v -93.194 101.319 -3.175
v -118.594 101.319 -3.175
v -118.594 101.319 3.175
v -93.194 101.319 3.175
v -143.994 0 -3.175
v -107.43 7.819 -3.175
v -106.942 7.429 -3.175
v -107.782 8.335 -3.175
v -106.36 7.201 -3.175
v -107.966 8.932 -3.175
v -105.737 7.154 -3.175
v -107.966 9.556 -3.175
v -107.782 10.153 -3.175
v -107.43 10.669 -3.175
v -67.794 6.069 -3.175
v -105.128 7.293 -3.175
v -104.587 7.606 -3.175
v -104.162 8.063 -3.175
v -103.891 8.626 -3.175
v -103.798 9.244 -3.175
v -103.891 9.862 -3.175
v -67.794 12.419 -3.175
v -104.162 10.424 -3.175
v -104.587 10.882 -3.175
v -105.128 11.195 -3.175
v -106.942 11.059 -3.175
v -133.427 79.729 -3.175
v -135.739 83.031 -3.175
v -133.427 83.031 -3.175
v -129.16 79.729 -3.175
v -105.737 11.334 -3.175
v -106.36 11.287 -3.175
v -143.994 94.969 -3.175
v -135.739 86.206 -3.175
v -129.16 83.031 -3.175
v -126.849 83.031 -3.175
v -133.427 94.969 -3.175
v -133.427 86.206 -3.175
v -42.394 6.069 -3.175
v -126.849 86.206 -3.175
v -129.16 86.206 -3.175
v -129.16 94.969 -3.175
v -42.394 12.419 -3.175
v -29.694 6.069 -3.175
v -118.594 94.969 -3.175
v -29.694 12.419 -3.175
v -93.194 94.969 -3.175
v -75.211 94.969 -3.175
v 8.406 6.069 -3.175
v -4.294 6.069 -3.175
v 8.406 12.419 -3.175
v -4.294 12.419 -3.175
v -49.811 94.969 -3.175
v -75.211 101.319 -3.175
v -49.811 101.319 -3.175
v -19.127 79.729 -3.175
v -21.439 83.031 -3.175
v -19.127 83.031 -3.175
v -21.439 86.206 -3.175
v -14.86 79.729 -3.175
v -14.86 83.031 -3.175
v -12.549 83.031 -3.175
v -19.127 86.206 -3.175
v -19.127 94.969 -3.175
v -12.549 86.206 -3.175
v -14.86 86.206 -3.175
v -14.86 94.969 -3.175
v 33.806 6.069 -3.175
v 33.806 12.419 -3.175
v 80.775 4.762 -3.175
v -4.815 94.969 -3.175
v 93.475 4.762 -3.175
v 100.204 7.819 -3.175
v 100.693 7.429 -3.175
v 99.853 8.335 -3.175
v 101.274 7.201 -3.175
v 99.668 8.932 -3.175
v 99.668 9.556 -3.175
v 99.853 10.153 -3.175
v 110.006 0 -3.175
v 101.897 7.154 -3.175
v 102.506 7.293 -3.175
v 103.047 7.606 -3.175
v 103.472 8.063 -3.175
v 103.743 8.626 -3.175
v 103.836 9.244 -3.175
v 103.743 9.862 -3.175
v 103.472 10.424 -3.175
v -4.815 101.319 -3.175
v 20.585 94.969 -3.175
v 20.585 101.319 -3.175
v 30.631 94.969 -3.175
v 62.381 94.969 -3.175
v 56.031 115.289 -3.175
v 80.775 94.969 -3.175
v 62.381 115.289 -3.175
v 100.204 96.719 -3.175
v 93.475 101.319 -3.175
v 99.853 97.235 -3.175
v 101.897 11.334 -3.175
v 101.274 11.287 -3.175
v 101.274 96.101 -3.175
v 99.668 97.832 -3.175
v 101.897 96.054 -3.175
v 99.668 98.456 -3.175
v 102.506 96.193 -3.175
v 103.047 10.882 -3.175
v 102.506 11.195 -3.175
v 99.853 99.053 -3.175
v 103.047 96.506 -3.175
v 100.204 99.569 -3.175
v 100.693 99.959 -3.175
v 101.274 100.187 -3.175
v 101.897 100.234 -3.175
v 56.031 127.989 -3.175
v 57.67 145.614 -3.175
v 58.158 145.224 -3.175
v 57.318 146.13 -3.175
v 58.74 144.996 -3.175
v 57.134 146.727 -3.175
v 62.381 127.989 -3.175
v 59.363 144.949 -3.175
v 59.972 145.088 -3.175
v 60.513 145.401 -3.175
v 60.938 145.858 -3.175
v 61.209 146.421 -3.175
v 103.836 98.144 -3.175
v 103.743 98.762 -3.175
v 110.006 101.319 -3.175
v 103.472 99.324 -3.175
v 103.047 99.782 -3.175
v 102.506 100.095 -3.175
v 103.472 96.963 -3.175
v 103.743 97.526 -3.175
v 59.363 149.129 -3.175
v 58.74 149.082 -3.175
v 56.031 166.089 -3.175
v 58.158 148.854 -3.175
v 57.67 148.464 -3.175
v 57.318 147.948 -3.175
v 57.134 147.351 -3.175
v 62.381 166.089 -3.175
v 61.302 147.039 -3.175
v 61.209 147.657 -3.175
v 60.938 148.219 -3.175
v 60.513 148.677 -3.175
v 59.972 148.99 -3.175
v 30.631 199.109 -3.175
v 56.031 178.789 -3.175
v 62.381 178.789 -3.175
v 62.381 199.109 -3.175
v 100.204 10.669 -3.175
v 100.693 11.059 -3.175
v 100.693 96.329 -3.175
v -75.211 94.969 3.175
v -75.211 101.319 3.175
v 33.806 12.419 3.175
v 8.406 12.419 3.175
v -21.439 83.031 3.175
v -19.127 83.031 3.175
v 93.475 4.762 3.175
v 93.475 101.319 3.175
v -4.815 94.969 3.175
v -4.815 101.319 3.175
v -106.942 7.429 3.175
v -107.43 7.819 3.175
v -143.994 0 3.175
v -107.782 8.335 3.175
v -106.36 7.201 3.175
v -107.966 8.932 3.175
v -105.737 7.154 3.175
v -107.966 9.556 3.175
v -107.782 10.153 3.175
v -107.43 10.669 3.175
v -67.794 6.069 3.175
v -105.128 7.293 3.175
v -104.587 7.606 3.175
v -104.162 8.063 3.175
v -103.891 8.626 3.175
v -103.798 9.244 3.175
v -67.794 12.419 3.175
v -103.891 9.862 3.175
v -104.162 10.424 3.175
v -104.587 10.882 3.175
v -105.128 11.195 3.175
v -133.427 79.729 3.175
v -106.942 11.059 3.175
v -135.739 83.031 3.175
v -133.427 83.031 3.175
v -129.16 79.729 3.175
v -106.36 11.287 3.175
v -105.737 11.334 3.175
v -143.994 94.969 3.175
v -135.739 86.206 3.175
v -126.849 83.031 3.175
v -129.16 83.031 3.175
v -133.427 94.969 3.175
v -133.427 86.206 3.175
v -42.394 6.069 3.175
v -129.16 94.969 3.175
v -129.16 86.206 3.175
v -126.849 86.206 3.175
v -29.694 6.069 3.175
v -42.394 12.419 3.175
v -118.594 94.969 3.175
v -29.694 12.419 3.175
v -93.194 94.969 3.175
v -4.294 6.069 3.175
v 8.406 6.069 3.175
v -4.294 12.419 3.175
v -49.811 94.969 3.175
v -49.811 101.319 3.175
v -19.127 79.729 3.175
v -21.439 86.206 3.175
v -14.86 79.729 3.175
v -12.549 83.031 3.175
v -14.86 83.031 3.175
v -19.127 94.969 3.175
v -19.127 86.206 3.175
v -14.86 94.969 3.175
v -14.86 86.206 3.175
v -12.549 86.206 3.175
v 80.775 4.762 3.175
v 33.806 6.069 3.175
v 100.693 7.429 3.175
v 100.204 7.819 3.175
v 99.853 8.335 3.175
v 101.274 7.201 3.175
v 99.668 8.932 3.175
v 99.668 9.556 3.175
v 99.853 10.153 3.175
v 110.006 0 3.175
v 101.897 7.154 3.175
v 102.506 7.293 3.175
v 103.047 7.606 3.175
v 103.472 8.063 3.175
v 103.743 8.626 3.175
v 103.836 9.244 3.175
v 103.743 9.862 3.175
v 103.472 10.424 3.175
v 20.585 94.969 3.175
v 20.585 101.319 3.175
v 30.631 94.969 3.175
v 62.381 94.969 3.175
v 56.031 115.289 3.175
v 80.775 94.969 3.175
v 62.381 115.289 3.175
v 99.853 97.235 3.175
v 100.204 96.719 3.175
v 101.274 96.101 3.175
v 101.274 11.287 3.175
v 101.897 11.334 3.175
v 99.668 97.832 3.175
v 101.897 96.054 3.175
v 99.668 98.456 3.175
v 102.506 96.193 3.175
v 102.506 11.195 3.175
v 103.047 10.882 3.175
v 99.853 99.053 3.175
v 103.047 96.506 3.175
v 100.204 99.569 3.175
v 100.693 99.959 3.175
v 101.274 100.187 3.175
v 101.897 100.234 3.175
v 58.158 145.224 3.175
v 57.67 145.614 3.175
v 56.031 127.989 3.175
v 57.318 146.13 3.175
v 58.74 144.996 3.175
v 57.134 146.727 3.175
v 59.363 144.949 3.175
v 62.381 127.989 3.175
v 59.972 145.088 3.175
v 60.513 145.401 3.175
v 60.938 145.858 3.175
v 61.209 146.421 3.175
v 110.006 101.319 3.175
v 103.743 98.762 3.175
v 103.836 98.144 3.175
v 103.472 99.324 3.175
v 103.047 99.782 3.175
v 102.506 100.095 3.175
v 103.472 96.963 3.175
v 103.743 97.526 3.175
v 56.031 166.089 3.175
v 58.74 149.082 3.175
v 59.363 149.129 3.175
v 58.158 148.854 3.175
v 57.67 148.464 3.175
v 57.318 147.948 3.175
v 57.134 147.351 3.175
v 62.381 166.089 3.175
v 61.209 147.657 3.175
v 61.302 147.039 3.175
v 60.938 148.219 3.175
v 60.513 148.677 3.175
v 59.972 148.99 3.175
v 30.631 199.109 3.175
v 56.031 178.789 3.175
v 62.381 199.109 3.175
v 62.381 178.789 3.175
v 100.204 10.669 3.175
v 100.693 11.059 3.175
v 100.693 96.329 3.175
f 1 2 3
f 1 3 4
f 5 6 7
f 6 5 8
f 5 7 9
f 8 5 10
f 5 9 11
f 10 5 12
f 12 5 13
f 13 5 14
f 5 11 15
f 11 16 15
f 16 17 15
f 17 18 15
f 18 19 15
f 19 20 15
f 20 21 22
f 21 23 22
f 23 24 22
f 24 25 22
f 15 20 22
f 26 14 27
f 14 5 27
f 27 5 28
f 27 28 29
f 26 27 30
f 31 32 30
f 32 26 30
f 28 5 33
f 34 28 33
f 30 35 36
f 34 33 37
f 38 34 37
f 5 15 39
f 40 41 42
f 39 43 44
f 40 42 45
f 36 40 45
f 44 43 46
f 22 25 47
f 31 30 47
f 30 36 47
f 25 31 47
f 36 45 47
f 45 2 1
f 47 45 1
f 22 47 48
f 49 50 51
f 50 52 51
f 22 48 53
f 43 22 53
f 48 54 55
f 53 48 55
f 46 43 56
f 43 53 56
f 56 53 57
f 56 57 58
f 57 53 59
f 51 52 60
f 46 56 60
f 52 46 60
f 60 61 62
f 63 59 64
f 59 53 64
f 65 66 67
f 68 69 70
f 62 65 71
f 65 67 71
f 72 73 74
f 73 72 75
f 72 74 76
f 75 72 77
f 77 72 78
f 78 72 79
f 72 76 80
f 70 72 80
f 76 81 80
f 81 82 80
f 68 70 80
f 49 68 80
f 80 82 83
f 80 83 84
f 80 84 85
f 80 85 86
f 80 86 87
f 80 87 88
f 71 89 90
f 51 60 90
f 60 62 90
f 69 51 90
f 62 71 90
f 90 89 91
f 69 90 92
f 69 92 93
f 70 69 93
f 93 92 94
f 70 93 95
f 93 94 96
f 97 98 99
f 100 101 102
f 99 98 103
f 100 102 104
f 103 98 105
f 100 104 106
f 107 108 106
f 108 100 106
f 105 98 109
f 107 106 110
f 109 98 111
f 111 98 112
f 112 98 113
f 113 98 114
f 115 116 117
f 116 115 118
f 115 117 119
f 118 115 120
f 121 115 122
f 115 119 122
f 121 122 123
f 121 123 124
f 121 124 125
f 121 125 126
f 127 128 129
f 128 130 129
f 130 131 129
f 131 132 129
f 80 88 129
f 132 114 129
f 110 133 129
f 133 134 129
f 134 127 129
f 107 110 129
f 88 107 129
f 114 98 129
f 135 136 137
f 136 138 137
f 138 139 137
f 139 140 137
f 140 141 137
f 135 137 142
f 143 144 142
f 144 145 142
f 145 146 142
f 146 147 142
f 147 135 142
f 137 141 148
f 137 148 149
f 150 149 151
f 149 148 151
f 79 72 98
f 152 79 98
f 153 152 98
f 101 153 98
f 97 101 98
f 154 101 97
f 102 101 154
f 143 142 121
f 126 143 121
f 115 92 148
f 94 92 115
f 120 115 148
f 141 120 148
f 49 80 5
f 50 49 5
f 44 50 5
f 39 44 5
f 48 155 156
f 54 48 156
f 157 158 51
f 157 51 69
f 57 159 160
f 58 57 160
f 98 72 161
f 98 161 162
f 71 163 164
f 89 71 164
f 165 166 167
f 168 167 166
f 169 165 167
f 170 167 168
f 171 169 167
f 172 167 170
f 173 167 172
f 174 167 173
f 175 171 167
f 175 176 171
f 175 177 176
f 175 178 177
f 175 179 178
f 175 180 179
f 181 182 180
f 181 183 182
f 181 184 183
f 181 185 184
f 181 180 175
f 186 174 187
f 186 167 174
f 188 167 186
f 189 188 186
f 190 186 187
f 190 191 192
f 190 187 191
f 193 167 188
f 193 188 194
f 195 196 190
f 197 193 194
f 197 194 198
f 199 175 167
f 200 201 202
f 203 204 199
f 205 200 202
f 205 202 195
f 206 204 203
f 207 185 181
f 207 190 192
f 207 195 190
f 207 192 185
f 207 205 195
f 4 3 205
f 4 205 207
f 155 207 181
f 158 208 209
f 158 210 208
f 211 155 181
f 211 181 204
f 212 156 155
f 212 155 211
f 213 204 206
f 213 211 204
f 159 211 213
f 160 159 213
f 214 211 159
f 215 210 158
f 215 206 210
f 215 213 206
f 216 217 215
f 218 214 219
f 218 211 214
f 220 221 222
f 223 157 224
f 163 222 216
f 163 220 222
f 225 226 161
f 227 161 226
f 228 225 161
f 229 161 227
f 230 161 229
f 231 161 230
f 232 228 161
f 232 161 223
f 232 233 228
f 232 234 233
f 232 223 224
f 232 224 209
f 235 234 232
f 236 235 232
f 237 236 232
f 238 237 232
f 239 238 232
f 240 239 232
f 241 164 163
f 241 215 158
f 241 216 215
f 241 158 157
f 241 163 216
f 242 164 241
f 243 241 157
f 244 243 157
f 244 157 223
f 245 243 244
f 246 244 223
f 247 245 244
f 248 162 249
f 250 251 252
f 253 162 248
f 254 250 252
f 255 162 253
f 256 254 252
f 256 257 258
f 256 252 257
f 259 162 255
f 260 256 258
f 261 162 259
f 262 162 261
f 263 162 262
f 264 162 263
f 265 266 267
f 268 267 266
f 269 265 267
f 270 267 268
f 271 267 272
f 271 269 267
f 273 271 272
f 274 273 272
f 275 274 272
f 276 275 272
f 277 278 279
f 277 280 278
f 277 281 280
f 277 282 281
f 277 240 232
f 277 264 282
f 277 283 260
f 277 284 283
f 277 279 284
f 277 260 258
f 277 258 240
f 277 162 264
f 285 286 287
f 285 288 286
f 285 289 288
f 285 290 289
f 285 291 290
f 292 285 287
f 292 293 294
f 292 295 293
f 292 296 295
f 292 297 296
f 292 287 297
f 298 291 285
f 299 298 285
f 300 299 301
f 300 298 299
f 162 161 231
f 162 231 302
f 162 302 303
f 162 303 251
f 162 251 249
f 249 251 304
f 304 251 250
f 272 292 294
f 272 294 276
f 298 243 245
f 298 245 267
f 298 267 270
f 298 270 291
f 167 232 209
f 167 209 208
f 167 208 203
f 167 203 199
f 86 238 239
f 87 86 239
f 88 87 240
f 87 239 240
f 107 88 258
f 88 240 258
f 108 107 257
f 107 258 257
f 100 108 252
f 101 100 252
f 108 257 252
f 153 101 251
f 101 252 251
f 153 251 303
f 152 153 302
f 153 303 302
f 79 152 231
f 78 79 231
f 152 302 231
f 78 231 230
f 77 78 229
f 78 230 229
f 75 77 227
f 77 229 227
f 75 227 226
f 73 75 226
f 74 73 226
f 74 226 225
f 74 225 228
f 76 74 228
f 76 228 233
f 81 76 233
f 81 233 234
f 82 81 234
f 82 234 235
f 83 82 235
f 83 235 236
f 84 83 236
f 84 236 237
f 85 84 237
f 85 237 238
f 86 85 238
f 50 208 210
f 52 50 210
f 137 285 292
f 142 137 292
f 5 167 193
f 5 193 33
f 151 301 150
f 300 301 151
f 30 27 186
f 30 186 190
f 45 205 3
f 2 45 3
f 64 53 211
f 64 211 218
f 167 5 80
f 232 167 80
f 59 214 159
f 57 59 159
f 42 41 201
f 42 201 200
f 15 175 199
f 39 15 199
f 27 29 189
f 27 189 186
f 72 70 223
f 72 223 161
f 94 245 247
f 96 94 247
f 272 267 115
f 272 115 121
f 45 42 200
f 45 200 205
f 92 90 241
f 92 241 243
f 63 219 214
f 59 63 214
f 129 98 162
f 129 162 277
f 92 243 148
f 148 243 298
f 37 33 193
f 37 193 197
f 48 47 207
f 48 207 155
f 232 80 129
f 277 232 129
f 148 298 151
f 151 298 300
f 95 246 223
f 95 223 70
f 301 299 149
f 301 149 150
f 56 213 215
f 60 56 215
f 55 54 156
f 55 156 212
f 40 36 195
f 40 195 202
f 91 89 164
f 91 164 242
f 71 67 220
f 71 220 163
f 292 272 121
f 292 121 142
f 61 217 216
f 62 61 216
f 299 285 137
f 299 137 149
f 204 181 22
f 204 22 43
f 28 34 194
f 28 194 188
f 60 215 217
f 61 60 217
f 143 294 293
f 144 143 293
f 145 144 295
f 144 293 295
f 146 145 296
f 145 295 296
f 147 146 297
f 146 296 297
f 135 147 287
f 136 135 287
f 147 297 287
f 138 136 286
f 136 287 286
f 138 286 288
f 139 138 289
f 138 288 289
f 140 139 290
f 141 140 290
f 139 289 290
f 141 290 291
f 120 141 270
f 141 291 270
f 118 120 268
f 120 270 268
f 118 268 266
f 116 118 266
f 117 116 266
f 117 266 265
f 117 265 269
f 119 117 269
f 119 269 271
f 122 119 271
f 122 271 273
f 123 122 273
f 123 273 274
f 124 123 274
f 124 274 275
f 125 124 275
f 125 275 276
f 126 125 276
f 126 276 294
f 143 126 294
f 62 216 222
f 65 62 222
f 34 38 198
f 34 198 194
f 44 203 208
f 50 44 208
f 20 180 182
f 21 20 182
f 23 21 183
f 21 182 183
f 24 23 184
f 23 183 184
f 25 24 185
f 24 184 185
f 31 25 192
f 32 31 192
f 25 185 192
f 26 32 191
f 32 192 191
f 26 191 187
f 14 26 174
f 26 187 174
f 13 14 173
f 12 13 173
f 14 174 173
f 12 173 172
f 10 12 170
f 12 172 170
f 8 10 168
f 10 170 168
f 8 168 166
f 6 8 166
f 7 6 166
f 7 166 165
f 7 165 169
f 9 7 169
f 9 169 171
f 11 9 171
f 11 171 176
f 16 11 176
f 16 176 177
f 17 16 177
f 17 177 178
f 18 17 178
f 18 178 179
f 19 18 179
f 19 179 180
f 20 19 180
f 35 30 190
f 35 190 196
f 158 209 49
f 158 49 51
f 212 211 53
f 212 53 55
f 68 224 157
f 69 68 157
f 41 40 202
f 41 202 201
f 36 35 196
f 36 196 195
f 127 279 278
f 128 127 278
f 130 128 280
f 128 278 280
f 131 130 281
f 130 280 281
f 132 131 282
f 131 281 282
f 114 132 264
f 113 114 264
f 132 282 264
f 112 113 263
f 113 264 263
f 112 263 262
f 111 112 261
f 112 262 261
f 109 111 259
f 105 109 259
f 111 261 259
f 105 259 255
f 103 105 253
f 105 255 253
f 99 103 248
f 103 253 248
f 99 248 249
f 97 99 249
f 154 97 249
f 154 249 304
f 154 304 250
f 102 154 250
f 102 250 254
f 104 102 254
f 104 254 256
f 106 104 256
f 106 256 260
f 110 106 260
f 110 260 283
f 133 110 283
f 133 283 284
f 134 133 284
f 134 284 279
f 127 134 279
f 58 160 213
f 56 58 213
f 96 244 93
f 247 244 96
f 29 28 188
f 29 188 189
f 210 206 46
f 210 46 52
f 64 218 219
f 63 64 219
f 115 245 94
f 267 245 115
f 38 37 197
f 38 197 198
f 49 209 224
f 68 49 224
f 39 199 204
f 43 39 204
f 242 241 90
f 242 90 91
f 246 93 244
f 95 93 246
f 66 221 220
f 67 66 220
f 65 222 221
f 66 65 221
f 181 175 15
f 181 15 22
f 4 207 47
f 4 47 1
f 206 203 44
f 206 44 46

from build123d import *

# Parameters (mm, degrees)
SKETCH1_W                       = 254
SKETCH1_H                       = 6.35
BASE_EXTRUSION_DEPTH            = 94.968888282
SKETCH4_W                       = 25.4
SKETCH4_H                       = 6.35
TAB_HOLES_TO_CHASSIS_BASE_DEPTH = 173.608322449
T_SLOT_CENTER_DEPTH             = 173.608322449
SKETCH6_W                       = 31.75
SKETCH6_H                       = 104.14
ARM_SUPPORT_DEPTH               = 6.35
SKETCH8_W                       = 12.7
SKETCH8_H                       = 6.35
ARM_CLEARANCE_DEPTH             = 90.206388282
SKETCH9_R                       = 2.0955
BASE_MOUNTING_HOLE_1_DEPTH      = 246.802548054
SKETCH10_R                      = 2.0955
BASE_MOUNTING_HOLE_2_DEPTH      = 246.802548054
SKETCH11_R                      = 2.0955
ARM_SUPPORT_MOUNTING_HOLE_DEPTH = 246.802548054
SKETCH12_W                      = 6.35
SKETCH12_H                      = 12.7
ARM_SUPPORT_TAB_SLOTS_DEPTH     = 246.802548054
T_START                         = -6.35
T_SLOT_TOP_CORNER_DEPTH         = 6.35
T_SLOT_TOP_CORNER_2_OUTLINE_W   = 25.4
T_SLOT_TOP_CORNER_2_OUTLINE_H   = 6.35
T_SLOT_TOP_CORNER_2_OUTLINE_W_2 = 16.5312
T_SLOT_TOP_CORNER_2_DEPTH       = 6.35
SKETCH15_R                      = 2.0955
CUT_EXTRUDE8_DEPTH              = 246.802548054


# Read off the part's stored shape, not the designer's step: T Slot Top Corner
with BuildPart() as part:
    # Sketch1 → Base Extrusion (new body)
    with BuildSketch(Plane(origin=(0, 0, 0), x_dir=(1, 0, 0), z_dir=(0, 1, 0))):
        with Locations((-16.993821871, 0)):
            Rectangle(SKETCH1_W, SKETCH1_H)
    extrude(amount=BASE_EXTRUSION_DEPTH)

    # Sketch4 → Tab Holes to Chassis Base (cut, through all)
    with BuildSketch(Plane.XY.offset(3.175)):
        with Locations((-55.093821871, 9.243888282)):
            Rectangle(SKETCH4_W, SKETCH4_H)
        with Locations((-16.993821871, 9.243888282)):
            Rectangle(SKETCH4_W, SKETCH4_H)
        with Locations((21.106178129, 9.243888282)):
            Rectangle(SKETCH4_W, SKETCH4_H)
    extrude(amount=-TAB_HOLES_TO_CHASSIS_BASE_DEPTH, mode=Mode.SUBTRACT)

    # Sketch5 → T Slot Center (cut, through all)
    with BuildSketch(Plane.XY.offset(3.175)):
        Polygon((-14.860221871, 94.968888282), (-19.127421871, 94.968888282), (-19.127421871, 86.205888282), (-21.438821871, 86.205888282), (-21.438821871, 83.030888282), (-19.127421871, 83.030888282), (-19.127421871, 79.728888282), (-14.860221871, 79.728888282), (-14.860221871, 83.030888282), (-12.548821871, 83.030888282), (-12.548821871, 86.205888282), (-14.860221871, 86.205888282), align=None)
    extrude(amount=-T_SLOT_CENTER_DEPTH, mode=Mode.SUBTRACT)

    # Sketch6 → Arm Support (add)
    with BuildSketch(Plane.XY.offset(3.175)):
        with Locations((46.506178129, 147.038888282)):
            Rectangle(SKETCH6_W, SKETCH6_H)
    extrude(amount=-ARM_SUPPORT_DEPTH)

    # Sketch8 → Arm Clearance (cut)
    with BuildSketch(Plane(origin=(0, 94.968888282, 0), x_dir=(1, 0, 0), z_dir=(0, 1, 0))):
        with Locations((87.124978129, 0)):
            Rectangle(SKETCH8_W, SKETCH8_H)
    extrude(amount=-ARM_CLEARANCE_DEPTH, mode=Mode.SUBTRACT)

    # Sketch9 → Base Mounting Hole 1 (cut, through all)
    with BuildSketch(Plane.XY.offset(3.175)):
        with Locations((101.740578129, 9.243888282)):
            Circle(SKETCH9_R)
    extrude(amount=-BASE_MOUNTING_HOLE_1_DEPTH, mode=Mode.SUBTRACT)

    # Sketch10 → Base Mounting Hole 2 (cut, through all)
    with BuildSketch(Plane.XY.offset(3.175)):
        with Locations((-105.893821871, 9.243888282)):
            Circle(SKETCH10_R)
    extrude(amount=-BASE_MOUNTING_HOLE_2_DEPTH, mode=Mode.SUBTRACT)

    # Sketch11 → Arm Support Mounting Hole (cut, through all)
    with BuildSketch(Plane.XY.offset(3.175)):
        with Locations((59.206178129, 147.038888282)):
            Circle(SKETCH11_R)
    extrude(amount=-ARM_SUPPORT_MOUNTING_HOLE_DEPTH, mode=Mode.SUBTRACT)

    # Sketch12 → Arm Support Tab Slots (cut, through all)
    with BuildSketch(Plane.XY.offset(3.175)):
        with Locations((59.206178129, 172.438888282)):
            Rectangle(SKETCH12_W, SKETCH12_H)
        with Locations((59.206178129, 121.638888282)):
            Rectangle(SKETCH12_W, SKETCH12_H)
    extrude(amount=-ARM_SUPPORT_TAB_SLOTS_DEPTH, mode=Mode.SUBTRACT)

    # T Slot Top Corner outline → T Slot Top Corner (cut)
    with BuildSketch(Plane.XY.offset(3.175).offset(T_START)):
        Polygon((-126.848821871, 83.030888282), (-126.848821871, 86.205888282), (-129.160221871, 86.205888282), (-129.160221871, 94.968888282), (-133.427421871, 94.968888282), (-133.427421871, 86.205888282), (-135.738821871, 86.205888282), (-135.738821871, 83.030888282), (-133.427421871, 83.030888282), (-133.427421871, 79.728888282), (-129.160221871, 79.728888282), (-129.160221871, 83.030888282), align=None)
    extrude(amount=T_SLOT_TOP_CORNER_DEPTH, mode=Mode.SUBTRACT)

    # T Slot Top Corner 2 outline → T Slot Top Corner 2 (add)
    with BuildSketch(Plane.XY.offset(3.175).offset(T_START)):
        with Locations((-62.510621871, 98.143888282)):
            Rectangle(T_SLOT_TOP_CORNER_2_OUTLINE_W, T_SLOT_TOP_CORNER_2_OUTLINE_H)
        with Locations((-105.893821871, 98.143888282)):
            Rectangle(T_SLOT_TOP_CORNER_2_OUTLINE_W, T_SLOT_TOP_CORNER_2_OUTLINE_H)
        with Locations((101.740578129, 98.143888282)):
            Rectangle(T_SLOT_TOP_CORNER_2_OUTLINE_W_2, T_SLOT_TOP_CORNER_2_OUTLINE_H)
        with Locations((7.885478129, 98.143888282)):
            Rectangle(T_SLOT_TOP_CORNER_2_OUTLINE_W, T_SLOT_TOP_CORNER_2_OUTLINE_H)
    extrude(amount=T_SLOT_TOP_CORNER_2_DEPTH)

    # Sketch15 → Cut-Extrude8 (cut, through all)
    with BuildSketch(Plane.XY.offset(3.175)):
        with Locations((101.740578129, 98.143888282)):
            Circle(SKETCH15_R)
    extrude(amount=-CUT_EXTRUDE8_DEPTH, mode=Mode.SUBTRACT)


solid = part.part
